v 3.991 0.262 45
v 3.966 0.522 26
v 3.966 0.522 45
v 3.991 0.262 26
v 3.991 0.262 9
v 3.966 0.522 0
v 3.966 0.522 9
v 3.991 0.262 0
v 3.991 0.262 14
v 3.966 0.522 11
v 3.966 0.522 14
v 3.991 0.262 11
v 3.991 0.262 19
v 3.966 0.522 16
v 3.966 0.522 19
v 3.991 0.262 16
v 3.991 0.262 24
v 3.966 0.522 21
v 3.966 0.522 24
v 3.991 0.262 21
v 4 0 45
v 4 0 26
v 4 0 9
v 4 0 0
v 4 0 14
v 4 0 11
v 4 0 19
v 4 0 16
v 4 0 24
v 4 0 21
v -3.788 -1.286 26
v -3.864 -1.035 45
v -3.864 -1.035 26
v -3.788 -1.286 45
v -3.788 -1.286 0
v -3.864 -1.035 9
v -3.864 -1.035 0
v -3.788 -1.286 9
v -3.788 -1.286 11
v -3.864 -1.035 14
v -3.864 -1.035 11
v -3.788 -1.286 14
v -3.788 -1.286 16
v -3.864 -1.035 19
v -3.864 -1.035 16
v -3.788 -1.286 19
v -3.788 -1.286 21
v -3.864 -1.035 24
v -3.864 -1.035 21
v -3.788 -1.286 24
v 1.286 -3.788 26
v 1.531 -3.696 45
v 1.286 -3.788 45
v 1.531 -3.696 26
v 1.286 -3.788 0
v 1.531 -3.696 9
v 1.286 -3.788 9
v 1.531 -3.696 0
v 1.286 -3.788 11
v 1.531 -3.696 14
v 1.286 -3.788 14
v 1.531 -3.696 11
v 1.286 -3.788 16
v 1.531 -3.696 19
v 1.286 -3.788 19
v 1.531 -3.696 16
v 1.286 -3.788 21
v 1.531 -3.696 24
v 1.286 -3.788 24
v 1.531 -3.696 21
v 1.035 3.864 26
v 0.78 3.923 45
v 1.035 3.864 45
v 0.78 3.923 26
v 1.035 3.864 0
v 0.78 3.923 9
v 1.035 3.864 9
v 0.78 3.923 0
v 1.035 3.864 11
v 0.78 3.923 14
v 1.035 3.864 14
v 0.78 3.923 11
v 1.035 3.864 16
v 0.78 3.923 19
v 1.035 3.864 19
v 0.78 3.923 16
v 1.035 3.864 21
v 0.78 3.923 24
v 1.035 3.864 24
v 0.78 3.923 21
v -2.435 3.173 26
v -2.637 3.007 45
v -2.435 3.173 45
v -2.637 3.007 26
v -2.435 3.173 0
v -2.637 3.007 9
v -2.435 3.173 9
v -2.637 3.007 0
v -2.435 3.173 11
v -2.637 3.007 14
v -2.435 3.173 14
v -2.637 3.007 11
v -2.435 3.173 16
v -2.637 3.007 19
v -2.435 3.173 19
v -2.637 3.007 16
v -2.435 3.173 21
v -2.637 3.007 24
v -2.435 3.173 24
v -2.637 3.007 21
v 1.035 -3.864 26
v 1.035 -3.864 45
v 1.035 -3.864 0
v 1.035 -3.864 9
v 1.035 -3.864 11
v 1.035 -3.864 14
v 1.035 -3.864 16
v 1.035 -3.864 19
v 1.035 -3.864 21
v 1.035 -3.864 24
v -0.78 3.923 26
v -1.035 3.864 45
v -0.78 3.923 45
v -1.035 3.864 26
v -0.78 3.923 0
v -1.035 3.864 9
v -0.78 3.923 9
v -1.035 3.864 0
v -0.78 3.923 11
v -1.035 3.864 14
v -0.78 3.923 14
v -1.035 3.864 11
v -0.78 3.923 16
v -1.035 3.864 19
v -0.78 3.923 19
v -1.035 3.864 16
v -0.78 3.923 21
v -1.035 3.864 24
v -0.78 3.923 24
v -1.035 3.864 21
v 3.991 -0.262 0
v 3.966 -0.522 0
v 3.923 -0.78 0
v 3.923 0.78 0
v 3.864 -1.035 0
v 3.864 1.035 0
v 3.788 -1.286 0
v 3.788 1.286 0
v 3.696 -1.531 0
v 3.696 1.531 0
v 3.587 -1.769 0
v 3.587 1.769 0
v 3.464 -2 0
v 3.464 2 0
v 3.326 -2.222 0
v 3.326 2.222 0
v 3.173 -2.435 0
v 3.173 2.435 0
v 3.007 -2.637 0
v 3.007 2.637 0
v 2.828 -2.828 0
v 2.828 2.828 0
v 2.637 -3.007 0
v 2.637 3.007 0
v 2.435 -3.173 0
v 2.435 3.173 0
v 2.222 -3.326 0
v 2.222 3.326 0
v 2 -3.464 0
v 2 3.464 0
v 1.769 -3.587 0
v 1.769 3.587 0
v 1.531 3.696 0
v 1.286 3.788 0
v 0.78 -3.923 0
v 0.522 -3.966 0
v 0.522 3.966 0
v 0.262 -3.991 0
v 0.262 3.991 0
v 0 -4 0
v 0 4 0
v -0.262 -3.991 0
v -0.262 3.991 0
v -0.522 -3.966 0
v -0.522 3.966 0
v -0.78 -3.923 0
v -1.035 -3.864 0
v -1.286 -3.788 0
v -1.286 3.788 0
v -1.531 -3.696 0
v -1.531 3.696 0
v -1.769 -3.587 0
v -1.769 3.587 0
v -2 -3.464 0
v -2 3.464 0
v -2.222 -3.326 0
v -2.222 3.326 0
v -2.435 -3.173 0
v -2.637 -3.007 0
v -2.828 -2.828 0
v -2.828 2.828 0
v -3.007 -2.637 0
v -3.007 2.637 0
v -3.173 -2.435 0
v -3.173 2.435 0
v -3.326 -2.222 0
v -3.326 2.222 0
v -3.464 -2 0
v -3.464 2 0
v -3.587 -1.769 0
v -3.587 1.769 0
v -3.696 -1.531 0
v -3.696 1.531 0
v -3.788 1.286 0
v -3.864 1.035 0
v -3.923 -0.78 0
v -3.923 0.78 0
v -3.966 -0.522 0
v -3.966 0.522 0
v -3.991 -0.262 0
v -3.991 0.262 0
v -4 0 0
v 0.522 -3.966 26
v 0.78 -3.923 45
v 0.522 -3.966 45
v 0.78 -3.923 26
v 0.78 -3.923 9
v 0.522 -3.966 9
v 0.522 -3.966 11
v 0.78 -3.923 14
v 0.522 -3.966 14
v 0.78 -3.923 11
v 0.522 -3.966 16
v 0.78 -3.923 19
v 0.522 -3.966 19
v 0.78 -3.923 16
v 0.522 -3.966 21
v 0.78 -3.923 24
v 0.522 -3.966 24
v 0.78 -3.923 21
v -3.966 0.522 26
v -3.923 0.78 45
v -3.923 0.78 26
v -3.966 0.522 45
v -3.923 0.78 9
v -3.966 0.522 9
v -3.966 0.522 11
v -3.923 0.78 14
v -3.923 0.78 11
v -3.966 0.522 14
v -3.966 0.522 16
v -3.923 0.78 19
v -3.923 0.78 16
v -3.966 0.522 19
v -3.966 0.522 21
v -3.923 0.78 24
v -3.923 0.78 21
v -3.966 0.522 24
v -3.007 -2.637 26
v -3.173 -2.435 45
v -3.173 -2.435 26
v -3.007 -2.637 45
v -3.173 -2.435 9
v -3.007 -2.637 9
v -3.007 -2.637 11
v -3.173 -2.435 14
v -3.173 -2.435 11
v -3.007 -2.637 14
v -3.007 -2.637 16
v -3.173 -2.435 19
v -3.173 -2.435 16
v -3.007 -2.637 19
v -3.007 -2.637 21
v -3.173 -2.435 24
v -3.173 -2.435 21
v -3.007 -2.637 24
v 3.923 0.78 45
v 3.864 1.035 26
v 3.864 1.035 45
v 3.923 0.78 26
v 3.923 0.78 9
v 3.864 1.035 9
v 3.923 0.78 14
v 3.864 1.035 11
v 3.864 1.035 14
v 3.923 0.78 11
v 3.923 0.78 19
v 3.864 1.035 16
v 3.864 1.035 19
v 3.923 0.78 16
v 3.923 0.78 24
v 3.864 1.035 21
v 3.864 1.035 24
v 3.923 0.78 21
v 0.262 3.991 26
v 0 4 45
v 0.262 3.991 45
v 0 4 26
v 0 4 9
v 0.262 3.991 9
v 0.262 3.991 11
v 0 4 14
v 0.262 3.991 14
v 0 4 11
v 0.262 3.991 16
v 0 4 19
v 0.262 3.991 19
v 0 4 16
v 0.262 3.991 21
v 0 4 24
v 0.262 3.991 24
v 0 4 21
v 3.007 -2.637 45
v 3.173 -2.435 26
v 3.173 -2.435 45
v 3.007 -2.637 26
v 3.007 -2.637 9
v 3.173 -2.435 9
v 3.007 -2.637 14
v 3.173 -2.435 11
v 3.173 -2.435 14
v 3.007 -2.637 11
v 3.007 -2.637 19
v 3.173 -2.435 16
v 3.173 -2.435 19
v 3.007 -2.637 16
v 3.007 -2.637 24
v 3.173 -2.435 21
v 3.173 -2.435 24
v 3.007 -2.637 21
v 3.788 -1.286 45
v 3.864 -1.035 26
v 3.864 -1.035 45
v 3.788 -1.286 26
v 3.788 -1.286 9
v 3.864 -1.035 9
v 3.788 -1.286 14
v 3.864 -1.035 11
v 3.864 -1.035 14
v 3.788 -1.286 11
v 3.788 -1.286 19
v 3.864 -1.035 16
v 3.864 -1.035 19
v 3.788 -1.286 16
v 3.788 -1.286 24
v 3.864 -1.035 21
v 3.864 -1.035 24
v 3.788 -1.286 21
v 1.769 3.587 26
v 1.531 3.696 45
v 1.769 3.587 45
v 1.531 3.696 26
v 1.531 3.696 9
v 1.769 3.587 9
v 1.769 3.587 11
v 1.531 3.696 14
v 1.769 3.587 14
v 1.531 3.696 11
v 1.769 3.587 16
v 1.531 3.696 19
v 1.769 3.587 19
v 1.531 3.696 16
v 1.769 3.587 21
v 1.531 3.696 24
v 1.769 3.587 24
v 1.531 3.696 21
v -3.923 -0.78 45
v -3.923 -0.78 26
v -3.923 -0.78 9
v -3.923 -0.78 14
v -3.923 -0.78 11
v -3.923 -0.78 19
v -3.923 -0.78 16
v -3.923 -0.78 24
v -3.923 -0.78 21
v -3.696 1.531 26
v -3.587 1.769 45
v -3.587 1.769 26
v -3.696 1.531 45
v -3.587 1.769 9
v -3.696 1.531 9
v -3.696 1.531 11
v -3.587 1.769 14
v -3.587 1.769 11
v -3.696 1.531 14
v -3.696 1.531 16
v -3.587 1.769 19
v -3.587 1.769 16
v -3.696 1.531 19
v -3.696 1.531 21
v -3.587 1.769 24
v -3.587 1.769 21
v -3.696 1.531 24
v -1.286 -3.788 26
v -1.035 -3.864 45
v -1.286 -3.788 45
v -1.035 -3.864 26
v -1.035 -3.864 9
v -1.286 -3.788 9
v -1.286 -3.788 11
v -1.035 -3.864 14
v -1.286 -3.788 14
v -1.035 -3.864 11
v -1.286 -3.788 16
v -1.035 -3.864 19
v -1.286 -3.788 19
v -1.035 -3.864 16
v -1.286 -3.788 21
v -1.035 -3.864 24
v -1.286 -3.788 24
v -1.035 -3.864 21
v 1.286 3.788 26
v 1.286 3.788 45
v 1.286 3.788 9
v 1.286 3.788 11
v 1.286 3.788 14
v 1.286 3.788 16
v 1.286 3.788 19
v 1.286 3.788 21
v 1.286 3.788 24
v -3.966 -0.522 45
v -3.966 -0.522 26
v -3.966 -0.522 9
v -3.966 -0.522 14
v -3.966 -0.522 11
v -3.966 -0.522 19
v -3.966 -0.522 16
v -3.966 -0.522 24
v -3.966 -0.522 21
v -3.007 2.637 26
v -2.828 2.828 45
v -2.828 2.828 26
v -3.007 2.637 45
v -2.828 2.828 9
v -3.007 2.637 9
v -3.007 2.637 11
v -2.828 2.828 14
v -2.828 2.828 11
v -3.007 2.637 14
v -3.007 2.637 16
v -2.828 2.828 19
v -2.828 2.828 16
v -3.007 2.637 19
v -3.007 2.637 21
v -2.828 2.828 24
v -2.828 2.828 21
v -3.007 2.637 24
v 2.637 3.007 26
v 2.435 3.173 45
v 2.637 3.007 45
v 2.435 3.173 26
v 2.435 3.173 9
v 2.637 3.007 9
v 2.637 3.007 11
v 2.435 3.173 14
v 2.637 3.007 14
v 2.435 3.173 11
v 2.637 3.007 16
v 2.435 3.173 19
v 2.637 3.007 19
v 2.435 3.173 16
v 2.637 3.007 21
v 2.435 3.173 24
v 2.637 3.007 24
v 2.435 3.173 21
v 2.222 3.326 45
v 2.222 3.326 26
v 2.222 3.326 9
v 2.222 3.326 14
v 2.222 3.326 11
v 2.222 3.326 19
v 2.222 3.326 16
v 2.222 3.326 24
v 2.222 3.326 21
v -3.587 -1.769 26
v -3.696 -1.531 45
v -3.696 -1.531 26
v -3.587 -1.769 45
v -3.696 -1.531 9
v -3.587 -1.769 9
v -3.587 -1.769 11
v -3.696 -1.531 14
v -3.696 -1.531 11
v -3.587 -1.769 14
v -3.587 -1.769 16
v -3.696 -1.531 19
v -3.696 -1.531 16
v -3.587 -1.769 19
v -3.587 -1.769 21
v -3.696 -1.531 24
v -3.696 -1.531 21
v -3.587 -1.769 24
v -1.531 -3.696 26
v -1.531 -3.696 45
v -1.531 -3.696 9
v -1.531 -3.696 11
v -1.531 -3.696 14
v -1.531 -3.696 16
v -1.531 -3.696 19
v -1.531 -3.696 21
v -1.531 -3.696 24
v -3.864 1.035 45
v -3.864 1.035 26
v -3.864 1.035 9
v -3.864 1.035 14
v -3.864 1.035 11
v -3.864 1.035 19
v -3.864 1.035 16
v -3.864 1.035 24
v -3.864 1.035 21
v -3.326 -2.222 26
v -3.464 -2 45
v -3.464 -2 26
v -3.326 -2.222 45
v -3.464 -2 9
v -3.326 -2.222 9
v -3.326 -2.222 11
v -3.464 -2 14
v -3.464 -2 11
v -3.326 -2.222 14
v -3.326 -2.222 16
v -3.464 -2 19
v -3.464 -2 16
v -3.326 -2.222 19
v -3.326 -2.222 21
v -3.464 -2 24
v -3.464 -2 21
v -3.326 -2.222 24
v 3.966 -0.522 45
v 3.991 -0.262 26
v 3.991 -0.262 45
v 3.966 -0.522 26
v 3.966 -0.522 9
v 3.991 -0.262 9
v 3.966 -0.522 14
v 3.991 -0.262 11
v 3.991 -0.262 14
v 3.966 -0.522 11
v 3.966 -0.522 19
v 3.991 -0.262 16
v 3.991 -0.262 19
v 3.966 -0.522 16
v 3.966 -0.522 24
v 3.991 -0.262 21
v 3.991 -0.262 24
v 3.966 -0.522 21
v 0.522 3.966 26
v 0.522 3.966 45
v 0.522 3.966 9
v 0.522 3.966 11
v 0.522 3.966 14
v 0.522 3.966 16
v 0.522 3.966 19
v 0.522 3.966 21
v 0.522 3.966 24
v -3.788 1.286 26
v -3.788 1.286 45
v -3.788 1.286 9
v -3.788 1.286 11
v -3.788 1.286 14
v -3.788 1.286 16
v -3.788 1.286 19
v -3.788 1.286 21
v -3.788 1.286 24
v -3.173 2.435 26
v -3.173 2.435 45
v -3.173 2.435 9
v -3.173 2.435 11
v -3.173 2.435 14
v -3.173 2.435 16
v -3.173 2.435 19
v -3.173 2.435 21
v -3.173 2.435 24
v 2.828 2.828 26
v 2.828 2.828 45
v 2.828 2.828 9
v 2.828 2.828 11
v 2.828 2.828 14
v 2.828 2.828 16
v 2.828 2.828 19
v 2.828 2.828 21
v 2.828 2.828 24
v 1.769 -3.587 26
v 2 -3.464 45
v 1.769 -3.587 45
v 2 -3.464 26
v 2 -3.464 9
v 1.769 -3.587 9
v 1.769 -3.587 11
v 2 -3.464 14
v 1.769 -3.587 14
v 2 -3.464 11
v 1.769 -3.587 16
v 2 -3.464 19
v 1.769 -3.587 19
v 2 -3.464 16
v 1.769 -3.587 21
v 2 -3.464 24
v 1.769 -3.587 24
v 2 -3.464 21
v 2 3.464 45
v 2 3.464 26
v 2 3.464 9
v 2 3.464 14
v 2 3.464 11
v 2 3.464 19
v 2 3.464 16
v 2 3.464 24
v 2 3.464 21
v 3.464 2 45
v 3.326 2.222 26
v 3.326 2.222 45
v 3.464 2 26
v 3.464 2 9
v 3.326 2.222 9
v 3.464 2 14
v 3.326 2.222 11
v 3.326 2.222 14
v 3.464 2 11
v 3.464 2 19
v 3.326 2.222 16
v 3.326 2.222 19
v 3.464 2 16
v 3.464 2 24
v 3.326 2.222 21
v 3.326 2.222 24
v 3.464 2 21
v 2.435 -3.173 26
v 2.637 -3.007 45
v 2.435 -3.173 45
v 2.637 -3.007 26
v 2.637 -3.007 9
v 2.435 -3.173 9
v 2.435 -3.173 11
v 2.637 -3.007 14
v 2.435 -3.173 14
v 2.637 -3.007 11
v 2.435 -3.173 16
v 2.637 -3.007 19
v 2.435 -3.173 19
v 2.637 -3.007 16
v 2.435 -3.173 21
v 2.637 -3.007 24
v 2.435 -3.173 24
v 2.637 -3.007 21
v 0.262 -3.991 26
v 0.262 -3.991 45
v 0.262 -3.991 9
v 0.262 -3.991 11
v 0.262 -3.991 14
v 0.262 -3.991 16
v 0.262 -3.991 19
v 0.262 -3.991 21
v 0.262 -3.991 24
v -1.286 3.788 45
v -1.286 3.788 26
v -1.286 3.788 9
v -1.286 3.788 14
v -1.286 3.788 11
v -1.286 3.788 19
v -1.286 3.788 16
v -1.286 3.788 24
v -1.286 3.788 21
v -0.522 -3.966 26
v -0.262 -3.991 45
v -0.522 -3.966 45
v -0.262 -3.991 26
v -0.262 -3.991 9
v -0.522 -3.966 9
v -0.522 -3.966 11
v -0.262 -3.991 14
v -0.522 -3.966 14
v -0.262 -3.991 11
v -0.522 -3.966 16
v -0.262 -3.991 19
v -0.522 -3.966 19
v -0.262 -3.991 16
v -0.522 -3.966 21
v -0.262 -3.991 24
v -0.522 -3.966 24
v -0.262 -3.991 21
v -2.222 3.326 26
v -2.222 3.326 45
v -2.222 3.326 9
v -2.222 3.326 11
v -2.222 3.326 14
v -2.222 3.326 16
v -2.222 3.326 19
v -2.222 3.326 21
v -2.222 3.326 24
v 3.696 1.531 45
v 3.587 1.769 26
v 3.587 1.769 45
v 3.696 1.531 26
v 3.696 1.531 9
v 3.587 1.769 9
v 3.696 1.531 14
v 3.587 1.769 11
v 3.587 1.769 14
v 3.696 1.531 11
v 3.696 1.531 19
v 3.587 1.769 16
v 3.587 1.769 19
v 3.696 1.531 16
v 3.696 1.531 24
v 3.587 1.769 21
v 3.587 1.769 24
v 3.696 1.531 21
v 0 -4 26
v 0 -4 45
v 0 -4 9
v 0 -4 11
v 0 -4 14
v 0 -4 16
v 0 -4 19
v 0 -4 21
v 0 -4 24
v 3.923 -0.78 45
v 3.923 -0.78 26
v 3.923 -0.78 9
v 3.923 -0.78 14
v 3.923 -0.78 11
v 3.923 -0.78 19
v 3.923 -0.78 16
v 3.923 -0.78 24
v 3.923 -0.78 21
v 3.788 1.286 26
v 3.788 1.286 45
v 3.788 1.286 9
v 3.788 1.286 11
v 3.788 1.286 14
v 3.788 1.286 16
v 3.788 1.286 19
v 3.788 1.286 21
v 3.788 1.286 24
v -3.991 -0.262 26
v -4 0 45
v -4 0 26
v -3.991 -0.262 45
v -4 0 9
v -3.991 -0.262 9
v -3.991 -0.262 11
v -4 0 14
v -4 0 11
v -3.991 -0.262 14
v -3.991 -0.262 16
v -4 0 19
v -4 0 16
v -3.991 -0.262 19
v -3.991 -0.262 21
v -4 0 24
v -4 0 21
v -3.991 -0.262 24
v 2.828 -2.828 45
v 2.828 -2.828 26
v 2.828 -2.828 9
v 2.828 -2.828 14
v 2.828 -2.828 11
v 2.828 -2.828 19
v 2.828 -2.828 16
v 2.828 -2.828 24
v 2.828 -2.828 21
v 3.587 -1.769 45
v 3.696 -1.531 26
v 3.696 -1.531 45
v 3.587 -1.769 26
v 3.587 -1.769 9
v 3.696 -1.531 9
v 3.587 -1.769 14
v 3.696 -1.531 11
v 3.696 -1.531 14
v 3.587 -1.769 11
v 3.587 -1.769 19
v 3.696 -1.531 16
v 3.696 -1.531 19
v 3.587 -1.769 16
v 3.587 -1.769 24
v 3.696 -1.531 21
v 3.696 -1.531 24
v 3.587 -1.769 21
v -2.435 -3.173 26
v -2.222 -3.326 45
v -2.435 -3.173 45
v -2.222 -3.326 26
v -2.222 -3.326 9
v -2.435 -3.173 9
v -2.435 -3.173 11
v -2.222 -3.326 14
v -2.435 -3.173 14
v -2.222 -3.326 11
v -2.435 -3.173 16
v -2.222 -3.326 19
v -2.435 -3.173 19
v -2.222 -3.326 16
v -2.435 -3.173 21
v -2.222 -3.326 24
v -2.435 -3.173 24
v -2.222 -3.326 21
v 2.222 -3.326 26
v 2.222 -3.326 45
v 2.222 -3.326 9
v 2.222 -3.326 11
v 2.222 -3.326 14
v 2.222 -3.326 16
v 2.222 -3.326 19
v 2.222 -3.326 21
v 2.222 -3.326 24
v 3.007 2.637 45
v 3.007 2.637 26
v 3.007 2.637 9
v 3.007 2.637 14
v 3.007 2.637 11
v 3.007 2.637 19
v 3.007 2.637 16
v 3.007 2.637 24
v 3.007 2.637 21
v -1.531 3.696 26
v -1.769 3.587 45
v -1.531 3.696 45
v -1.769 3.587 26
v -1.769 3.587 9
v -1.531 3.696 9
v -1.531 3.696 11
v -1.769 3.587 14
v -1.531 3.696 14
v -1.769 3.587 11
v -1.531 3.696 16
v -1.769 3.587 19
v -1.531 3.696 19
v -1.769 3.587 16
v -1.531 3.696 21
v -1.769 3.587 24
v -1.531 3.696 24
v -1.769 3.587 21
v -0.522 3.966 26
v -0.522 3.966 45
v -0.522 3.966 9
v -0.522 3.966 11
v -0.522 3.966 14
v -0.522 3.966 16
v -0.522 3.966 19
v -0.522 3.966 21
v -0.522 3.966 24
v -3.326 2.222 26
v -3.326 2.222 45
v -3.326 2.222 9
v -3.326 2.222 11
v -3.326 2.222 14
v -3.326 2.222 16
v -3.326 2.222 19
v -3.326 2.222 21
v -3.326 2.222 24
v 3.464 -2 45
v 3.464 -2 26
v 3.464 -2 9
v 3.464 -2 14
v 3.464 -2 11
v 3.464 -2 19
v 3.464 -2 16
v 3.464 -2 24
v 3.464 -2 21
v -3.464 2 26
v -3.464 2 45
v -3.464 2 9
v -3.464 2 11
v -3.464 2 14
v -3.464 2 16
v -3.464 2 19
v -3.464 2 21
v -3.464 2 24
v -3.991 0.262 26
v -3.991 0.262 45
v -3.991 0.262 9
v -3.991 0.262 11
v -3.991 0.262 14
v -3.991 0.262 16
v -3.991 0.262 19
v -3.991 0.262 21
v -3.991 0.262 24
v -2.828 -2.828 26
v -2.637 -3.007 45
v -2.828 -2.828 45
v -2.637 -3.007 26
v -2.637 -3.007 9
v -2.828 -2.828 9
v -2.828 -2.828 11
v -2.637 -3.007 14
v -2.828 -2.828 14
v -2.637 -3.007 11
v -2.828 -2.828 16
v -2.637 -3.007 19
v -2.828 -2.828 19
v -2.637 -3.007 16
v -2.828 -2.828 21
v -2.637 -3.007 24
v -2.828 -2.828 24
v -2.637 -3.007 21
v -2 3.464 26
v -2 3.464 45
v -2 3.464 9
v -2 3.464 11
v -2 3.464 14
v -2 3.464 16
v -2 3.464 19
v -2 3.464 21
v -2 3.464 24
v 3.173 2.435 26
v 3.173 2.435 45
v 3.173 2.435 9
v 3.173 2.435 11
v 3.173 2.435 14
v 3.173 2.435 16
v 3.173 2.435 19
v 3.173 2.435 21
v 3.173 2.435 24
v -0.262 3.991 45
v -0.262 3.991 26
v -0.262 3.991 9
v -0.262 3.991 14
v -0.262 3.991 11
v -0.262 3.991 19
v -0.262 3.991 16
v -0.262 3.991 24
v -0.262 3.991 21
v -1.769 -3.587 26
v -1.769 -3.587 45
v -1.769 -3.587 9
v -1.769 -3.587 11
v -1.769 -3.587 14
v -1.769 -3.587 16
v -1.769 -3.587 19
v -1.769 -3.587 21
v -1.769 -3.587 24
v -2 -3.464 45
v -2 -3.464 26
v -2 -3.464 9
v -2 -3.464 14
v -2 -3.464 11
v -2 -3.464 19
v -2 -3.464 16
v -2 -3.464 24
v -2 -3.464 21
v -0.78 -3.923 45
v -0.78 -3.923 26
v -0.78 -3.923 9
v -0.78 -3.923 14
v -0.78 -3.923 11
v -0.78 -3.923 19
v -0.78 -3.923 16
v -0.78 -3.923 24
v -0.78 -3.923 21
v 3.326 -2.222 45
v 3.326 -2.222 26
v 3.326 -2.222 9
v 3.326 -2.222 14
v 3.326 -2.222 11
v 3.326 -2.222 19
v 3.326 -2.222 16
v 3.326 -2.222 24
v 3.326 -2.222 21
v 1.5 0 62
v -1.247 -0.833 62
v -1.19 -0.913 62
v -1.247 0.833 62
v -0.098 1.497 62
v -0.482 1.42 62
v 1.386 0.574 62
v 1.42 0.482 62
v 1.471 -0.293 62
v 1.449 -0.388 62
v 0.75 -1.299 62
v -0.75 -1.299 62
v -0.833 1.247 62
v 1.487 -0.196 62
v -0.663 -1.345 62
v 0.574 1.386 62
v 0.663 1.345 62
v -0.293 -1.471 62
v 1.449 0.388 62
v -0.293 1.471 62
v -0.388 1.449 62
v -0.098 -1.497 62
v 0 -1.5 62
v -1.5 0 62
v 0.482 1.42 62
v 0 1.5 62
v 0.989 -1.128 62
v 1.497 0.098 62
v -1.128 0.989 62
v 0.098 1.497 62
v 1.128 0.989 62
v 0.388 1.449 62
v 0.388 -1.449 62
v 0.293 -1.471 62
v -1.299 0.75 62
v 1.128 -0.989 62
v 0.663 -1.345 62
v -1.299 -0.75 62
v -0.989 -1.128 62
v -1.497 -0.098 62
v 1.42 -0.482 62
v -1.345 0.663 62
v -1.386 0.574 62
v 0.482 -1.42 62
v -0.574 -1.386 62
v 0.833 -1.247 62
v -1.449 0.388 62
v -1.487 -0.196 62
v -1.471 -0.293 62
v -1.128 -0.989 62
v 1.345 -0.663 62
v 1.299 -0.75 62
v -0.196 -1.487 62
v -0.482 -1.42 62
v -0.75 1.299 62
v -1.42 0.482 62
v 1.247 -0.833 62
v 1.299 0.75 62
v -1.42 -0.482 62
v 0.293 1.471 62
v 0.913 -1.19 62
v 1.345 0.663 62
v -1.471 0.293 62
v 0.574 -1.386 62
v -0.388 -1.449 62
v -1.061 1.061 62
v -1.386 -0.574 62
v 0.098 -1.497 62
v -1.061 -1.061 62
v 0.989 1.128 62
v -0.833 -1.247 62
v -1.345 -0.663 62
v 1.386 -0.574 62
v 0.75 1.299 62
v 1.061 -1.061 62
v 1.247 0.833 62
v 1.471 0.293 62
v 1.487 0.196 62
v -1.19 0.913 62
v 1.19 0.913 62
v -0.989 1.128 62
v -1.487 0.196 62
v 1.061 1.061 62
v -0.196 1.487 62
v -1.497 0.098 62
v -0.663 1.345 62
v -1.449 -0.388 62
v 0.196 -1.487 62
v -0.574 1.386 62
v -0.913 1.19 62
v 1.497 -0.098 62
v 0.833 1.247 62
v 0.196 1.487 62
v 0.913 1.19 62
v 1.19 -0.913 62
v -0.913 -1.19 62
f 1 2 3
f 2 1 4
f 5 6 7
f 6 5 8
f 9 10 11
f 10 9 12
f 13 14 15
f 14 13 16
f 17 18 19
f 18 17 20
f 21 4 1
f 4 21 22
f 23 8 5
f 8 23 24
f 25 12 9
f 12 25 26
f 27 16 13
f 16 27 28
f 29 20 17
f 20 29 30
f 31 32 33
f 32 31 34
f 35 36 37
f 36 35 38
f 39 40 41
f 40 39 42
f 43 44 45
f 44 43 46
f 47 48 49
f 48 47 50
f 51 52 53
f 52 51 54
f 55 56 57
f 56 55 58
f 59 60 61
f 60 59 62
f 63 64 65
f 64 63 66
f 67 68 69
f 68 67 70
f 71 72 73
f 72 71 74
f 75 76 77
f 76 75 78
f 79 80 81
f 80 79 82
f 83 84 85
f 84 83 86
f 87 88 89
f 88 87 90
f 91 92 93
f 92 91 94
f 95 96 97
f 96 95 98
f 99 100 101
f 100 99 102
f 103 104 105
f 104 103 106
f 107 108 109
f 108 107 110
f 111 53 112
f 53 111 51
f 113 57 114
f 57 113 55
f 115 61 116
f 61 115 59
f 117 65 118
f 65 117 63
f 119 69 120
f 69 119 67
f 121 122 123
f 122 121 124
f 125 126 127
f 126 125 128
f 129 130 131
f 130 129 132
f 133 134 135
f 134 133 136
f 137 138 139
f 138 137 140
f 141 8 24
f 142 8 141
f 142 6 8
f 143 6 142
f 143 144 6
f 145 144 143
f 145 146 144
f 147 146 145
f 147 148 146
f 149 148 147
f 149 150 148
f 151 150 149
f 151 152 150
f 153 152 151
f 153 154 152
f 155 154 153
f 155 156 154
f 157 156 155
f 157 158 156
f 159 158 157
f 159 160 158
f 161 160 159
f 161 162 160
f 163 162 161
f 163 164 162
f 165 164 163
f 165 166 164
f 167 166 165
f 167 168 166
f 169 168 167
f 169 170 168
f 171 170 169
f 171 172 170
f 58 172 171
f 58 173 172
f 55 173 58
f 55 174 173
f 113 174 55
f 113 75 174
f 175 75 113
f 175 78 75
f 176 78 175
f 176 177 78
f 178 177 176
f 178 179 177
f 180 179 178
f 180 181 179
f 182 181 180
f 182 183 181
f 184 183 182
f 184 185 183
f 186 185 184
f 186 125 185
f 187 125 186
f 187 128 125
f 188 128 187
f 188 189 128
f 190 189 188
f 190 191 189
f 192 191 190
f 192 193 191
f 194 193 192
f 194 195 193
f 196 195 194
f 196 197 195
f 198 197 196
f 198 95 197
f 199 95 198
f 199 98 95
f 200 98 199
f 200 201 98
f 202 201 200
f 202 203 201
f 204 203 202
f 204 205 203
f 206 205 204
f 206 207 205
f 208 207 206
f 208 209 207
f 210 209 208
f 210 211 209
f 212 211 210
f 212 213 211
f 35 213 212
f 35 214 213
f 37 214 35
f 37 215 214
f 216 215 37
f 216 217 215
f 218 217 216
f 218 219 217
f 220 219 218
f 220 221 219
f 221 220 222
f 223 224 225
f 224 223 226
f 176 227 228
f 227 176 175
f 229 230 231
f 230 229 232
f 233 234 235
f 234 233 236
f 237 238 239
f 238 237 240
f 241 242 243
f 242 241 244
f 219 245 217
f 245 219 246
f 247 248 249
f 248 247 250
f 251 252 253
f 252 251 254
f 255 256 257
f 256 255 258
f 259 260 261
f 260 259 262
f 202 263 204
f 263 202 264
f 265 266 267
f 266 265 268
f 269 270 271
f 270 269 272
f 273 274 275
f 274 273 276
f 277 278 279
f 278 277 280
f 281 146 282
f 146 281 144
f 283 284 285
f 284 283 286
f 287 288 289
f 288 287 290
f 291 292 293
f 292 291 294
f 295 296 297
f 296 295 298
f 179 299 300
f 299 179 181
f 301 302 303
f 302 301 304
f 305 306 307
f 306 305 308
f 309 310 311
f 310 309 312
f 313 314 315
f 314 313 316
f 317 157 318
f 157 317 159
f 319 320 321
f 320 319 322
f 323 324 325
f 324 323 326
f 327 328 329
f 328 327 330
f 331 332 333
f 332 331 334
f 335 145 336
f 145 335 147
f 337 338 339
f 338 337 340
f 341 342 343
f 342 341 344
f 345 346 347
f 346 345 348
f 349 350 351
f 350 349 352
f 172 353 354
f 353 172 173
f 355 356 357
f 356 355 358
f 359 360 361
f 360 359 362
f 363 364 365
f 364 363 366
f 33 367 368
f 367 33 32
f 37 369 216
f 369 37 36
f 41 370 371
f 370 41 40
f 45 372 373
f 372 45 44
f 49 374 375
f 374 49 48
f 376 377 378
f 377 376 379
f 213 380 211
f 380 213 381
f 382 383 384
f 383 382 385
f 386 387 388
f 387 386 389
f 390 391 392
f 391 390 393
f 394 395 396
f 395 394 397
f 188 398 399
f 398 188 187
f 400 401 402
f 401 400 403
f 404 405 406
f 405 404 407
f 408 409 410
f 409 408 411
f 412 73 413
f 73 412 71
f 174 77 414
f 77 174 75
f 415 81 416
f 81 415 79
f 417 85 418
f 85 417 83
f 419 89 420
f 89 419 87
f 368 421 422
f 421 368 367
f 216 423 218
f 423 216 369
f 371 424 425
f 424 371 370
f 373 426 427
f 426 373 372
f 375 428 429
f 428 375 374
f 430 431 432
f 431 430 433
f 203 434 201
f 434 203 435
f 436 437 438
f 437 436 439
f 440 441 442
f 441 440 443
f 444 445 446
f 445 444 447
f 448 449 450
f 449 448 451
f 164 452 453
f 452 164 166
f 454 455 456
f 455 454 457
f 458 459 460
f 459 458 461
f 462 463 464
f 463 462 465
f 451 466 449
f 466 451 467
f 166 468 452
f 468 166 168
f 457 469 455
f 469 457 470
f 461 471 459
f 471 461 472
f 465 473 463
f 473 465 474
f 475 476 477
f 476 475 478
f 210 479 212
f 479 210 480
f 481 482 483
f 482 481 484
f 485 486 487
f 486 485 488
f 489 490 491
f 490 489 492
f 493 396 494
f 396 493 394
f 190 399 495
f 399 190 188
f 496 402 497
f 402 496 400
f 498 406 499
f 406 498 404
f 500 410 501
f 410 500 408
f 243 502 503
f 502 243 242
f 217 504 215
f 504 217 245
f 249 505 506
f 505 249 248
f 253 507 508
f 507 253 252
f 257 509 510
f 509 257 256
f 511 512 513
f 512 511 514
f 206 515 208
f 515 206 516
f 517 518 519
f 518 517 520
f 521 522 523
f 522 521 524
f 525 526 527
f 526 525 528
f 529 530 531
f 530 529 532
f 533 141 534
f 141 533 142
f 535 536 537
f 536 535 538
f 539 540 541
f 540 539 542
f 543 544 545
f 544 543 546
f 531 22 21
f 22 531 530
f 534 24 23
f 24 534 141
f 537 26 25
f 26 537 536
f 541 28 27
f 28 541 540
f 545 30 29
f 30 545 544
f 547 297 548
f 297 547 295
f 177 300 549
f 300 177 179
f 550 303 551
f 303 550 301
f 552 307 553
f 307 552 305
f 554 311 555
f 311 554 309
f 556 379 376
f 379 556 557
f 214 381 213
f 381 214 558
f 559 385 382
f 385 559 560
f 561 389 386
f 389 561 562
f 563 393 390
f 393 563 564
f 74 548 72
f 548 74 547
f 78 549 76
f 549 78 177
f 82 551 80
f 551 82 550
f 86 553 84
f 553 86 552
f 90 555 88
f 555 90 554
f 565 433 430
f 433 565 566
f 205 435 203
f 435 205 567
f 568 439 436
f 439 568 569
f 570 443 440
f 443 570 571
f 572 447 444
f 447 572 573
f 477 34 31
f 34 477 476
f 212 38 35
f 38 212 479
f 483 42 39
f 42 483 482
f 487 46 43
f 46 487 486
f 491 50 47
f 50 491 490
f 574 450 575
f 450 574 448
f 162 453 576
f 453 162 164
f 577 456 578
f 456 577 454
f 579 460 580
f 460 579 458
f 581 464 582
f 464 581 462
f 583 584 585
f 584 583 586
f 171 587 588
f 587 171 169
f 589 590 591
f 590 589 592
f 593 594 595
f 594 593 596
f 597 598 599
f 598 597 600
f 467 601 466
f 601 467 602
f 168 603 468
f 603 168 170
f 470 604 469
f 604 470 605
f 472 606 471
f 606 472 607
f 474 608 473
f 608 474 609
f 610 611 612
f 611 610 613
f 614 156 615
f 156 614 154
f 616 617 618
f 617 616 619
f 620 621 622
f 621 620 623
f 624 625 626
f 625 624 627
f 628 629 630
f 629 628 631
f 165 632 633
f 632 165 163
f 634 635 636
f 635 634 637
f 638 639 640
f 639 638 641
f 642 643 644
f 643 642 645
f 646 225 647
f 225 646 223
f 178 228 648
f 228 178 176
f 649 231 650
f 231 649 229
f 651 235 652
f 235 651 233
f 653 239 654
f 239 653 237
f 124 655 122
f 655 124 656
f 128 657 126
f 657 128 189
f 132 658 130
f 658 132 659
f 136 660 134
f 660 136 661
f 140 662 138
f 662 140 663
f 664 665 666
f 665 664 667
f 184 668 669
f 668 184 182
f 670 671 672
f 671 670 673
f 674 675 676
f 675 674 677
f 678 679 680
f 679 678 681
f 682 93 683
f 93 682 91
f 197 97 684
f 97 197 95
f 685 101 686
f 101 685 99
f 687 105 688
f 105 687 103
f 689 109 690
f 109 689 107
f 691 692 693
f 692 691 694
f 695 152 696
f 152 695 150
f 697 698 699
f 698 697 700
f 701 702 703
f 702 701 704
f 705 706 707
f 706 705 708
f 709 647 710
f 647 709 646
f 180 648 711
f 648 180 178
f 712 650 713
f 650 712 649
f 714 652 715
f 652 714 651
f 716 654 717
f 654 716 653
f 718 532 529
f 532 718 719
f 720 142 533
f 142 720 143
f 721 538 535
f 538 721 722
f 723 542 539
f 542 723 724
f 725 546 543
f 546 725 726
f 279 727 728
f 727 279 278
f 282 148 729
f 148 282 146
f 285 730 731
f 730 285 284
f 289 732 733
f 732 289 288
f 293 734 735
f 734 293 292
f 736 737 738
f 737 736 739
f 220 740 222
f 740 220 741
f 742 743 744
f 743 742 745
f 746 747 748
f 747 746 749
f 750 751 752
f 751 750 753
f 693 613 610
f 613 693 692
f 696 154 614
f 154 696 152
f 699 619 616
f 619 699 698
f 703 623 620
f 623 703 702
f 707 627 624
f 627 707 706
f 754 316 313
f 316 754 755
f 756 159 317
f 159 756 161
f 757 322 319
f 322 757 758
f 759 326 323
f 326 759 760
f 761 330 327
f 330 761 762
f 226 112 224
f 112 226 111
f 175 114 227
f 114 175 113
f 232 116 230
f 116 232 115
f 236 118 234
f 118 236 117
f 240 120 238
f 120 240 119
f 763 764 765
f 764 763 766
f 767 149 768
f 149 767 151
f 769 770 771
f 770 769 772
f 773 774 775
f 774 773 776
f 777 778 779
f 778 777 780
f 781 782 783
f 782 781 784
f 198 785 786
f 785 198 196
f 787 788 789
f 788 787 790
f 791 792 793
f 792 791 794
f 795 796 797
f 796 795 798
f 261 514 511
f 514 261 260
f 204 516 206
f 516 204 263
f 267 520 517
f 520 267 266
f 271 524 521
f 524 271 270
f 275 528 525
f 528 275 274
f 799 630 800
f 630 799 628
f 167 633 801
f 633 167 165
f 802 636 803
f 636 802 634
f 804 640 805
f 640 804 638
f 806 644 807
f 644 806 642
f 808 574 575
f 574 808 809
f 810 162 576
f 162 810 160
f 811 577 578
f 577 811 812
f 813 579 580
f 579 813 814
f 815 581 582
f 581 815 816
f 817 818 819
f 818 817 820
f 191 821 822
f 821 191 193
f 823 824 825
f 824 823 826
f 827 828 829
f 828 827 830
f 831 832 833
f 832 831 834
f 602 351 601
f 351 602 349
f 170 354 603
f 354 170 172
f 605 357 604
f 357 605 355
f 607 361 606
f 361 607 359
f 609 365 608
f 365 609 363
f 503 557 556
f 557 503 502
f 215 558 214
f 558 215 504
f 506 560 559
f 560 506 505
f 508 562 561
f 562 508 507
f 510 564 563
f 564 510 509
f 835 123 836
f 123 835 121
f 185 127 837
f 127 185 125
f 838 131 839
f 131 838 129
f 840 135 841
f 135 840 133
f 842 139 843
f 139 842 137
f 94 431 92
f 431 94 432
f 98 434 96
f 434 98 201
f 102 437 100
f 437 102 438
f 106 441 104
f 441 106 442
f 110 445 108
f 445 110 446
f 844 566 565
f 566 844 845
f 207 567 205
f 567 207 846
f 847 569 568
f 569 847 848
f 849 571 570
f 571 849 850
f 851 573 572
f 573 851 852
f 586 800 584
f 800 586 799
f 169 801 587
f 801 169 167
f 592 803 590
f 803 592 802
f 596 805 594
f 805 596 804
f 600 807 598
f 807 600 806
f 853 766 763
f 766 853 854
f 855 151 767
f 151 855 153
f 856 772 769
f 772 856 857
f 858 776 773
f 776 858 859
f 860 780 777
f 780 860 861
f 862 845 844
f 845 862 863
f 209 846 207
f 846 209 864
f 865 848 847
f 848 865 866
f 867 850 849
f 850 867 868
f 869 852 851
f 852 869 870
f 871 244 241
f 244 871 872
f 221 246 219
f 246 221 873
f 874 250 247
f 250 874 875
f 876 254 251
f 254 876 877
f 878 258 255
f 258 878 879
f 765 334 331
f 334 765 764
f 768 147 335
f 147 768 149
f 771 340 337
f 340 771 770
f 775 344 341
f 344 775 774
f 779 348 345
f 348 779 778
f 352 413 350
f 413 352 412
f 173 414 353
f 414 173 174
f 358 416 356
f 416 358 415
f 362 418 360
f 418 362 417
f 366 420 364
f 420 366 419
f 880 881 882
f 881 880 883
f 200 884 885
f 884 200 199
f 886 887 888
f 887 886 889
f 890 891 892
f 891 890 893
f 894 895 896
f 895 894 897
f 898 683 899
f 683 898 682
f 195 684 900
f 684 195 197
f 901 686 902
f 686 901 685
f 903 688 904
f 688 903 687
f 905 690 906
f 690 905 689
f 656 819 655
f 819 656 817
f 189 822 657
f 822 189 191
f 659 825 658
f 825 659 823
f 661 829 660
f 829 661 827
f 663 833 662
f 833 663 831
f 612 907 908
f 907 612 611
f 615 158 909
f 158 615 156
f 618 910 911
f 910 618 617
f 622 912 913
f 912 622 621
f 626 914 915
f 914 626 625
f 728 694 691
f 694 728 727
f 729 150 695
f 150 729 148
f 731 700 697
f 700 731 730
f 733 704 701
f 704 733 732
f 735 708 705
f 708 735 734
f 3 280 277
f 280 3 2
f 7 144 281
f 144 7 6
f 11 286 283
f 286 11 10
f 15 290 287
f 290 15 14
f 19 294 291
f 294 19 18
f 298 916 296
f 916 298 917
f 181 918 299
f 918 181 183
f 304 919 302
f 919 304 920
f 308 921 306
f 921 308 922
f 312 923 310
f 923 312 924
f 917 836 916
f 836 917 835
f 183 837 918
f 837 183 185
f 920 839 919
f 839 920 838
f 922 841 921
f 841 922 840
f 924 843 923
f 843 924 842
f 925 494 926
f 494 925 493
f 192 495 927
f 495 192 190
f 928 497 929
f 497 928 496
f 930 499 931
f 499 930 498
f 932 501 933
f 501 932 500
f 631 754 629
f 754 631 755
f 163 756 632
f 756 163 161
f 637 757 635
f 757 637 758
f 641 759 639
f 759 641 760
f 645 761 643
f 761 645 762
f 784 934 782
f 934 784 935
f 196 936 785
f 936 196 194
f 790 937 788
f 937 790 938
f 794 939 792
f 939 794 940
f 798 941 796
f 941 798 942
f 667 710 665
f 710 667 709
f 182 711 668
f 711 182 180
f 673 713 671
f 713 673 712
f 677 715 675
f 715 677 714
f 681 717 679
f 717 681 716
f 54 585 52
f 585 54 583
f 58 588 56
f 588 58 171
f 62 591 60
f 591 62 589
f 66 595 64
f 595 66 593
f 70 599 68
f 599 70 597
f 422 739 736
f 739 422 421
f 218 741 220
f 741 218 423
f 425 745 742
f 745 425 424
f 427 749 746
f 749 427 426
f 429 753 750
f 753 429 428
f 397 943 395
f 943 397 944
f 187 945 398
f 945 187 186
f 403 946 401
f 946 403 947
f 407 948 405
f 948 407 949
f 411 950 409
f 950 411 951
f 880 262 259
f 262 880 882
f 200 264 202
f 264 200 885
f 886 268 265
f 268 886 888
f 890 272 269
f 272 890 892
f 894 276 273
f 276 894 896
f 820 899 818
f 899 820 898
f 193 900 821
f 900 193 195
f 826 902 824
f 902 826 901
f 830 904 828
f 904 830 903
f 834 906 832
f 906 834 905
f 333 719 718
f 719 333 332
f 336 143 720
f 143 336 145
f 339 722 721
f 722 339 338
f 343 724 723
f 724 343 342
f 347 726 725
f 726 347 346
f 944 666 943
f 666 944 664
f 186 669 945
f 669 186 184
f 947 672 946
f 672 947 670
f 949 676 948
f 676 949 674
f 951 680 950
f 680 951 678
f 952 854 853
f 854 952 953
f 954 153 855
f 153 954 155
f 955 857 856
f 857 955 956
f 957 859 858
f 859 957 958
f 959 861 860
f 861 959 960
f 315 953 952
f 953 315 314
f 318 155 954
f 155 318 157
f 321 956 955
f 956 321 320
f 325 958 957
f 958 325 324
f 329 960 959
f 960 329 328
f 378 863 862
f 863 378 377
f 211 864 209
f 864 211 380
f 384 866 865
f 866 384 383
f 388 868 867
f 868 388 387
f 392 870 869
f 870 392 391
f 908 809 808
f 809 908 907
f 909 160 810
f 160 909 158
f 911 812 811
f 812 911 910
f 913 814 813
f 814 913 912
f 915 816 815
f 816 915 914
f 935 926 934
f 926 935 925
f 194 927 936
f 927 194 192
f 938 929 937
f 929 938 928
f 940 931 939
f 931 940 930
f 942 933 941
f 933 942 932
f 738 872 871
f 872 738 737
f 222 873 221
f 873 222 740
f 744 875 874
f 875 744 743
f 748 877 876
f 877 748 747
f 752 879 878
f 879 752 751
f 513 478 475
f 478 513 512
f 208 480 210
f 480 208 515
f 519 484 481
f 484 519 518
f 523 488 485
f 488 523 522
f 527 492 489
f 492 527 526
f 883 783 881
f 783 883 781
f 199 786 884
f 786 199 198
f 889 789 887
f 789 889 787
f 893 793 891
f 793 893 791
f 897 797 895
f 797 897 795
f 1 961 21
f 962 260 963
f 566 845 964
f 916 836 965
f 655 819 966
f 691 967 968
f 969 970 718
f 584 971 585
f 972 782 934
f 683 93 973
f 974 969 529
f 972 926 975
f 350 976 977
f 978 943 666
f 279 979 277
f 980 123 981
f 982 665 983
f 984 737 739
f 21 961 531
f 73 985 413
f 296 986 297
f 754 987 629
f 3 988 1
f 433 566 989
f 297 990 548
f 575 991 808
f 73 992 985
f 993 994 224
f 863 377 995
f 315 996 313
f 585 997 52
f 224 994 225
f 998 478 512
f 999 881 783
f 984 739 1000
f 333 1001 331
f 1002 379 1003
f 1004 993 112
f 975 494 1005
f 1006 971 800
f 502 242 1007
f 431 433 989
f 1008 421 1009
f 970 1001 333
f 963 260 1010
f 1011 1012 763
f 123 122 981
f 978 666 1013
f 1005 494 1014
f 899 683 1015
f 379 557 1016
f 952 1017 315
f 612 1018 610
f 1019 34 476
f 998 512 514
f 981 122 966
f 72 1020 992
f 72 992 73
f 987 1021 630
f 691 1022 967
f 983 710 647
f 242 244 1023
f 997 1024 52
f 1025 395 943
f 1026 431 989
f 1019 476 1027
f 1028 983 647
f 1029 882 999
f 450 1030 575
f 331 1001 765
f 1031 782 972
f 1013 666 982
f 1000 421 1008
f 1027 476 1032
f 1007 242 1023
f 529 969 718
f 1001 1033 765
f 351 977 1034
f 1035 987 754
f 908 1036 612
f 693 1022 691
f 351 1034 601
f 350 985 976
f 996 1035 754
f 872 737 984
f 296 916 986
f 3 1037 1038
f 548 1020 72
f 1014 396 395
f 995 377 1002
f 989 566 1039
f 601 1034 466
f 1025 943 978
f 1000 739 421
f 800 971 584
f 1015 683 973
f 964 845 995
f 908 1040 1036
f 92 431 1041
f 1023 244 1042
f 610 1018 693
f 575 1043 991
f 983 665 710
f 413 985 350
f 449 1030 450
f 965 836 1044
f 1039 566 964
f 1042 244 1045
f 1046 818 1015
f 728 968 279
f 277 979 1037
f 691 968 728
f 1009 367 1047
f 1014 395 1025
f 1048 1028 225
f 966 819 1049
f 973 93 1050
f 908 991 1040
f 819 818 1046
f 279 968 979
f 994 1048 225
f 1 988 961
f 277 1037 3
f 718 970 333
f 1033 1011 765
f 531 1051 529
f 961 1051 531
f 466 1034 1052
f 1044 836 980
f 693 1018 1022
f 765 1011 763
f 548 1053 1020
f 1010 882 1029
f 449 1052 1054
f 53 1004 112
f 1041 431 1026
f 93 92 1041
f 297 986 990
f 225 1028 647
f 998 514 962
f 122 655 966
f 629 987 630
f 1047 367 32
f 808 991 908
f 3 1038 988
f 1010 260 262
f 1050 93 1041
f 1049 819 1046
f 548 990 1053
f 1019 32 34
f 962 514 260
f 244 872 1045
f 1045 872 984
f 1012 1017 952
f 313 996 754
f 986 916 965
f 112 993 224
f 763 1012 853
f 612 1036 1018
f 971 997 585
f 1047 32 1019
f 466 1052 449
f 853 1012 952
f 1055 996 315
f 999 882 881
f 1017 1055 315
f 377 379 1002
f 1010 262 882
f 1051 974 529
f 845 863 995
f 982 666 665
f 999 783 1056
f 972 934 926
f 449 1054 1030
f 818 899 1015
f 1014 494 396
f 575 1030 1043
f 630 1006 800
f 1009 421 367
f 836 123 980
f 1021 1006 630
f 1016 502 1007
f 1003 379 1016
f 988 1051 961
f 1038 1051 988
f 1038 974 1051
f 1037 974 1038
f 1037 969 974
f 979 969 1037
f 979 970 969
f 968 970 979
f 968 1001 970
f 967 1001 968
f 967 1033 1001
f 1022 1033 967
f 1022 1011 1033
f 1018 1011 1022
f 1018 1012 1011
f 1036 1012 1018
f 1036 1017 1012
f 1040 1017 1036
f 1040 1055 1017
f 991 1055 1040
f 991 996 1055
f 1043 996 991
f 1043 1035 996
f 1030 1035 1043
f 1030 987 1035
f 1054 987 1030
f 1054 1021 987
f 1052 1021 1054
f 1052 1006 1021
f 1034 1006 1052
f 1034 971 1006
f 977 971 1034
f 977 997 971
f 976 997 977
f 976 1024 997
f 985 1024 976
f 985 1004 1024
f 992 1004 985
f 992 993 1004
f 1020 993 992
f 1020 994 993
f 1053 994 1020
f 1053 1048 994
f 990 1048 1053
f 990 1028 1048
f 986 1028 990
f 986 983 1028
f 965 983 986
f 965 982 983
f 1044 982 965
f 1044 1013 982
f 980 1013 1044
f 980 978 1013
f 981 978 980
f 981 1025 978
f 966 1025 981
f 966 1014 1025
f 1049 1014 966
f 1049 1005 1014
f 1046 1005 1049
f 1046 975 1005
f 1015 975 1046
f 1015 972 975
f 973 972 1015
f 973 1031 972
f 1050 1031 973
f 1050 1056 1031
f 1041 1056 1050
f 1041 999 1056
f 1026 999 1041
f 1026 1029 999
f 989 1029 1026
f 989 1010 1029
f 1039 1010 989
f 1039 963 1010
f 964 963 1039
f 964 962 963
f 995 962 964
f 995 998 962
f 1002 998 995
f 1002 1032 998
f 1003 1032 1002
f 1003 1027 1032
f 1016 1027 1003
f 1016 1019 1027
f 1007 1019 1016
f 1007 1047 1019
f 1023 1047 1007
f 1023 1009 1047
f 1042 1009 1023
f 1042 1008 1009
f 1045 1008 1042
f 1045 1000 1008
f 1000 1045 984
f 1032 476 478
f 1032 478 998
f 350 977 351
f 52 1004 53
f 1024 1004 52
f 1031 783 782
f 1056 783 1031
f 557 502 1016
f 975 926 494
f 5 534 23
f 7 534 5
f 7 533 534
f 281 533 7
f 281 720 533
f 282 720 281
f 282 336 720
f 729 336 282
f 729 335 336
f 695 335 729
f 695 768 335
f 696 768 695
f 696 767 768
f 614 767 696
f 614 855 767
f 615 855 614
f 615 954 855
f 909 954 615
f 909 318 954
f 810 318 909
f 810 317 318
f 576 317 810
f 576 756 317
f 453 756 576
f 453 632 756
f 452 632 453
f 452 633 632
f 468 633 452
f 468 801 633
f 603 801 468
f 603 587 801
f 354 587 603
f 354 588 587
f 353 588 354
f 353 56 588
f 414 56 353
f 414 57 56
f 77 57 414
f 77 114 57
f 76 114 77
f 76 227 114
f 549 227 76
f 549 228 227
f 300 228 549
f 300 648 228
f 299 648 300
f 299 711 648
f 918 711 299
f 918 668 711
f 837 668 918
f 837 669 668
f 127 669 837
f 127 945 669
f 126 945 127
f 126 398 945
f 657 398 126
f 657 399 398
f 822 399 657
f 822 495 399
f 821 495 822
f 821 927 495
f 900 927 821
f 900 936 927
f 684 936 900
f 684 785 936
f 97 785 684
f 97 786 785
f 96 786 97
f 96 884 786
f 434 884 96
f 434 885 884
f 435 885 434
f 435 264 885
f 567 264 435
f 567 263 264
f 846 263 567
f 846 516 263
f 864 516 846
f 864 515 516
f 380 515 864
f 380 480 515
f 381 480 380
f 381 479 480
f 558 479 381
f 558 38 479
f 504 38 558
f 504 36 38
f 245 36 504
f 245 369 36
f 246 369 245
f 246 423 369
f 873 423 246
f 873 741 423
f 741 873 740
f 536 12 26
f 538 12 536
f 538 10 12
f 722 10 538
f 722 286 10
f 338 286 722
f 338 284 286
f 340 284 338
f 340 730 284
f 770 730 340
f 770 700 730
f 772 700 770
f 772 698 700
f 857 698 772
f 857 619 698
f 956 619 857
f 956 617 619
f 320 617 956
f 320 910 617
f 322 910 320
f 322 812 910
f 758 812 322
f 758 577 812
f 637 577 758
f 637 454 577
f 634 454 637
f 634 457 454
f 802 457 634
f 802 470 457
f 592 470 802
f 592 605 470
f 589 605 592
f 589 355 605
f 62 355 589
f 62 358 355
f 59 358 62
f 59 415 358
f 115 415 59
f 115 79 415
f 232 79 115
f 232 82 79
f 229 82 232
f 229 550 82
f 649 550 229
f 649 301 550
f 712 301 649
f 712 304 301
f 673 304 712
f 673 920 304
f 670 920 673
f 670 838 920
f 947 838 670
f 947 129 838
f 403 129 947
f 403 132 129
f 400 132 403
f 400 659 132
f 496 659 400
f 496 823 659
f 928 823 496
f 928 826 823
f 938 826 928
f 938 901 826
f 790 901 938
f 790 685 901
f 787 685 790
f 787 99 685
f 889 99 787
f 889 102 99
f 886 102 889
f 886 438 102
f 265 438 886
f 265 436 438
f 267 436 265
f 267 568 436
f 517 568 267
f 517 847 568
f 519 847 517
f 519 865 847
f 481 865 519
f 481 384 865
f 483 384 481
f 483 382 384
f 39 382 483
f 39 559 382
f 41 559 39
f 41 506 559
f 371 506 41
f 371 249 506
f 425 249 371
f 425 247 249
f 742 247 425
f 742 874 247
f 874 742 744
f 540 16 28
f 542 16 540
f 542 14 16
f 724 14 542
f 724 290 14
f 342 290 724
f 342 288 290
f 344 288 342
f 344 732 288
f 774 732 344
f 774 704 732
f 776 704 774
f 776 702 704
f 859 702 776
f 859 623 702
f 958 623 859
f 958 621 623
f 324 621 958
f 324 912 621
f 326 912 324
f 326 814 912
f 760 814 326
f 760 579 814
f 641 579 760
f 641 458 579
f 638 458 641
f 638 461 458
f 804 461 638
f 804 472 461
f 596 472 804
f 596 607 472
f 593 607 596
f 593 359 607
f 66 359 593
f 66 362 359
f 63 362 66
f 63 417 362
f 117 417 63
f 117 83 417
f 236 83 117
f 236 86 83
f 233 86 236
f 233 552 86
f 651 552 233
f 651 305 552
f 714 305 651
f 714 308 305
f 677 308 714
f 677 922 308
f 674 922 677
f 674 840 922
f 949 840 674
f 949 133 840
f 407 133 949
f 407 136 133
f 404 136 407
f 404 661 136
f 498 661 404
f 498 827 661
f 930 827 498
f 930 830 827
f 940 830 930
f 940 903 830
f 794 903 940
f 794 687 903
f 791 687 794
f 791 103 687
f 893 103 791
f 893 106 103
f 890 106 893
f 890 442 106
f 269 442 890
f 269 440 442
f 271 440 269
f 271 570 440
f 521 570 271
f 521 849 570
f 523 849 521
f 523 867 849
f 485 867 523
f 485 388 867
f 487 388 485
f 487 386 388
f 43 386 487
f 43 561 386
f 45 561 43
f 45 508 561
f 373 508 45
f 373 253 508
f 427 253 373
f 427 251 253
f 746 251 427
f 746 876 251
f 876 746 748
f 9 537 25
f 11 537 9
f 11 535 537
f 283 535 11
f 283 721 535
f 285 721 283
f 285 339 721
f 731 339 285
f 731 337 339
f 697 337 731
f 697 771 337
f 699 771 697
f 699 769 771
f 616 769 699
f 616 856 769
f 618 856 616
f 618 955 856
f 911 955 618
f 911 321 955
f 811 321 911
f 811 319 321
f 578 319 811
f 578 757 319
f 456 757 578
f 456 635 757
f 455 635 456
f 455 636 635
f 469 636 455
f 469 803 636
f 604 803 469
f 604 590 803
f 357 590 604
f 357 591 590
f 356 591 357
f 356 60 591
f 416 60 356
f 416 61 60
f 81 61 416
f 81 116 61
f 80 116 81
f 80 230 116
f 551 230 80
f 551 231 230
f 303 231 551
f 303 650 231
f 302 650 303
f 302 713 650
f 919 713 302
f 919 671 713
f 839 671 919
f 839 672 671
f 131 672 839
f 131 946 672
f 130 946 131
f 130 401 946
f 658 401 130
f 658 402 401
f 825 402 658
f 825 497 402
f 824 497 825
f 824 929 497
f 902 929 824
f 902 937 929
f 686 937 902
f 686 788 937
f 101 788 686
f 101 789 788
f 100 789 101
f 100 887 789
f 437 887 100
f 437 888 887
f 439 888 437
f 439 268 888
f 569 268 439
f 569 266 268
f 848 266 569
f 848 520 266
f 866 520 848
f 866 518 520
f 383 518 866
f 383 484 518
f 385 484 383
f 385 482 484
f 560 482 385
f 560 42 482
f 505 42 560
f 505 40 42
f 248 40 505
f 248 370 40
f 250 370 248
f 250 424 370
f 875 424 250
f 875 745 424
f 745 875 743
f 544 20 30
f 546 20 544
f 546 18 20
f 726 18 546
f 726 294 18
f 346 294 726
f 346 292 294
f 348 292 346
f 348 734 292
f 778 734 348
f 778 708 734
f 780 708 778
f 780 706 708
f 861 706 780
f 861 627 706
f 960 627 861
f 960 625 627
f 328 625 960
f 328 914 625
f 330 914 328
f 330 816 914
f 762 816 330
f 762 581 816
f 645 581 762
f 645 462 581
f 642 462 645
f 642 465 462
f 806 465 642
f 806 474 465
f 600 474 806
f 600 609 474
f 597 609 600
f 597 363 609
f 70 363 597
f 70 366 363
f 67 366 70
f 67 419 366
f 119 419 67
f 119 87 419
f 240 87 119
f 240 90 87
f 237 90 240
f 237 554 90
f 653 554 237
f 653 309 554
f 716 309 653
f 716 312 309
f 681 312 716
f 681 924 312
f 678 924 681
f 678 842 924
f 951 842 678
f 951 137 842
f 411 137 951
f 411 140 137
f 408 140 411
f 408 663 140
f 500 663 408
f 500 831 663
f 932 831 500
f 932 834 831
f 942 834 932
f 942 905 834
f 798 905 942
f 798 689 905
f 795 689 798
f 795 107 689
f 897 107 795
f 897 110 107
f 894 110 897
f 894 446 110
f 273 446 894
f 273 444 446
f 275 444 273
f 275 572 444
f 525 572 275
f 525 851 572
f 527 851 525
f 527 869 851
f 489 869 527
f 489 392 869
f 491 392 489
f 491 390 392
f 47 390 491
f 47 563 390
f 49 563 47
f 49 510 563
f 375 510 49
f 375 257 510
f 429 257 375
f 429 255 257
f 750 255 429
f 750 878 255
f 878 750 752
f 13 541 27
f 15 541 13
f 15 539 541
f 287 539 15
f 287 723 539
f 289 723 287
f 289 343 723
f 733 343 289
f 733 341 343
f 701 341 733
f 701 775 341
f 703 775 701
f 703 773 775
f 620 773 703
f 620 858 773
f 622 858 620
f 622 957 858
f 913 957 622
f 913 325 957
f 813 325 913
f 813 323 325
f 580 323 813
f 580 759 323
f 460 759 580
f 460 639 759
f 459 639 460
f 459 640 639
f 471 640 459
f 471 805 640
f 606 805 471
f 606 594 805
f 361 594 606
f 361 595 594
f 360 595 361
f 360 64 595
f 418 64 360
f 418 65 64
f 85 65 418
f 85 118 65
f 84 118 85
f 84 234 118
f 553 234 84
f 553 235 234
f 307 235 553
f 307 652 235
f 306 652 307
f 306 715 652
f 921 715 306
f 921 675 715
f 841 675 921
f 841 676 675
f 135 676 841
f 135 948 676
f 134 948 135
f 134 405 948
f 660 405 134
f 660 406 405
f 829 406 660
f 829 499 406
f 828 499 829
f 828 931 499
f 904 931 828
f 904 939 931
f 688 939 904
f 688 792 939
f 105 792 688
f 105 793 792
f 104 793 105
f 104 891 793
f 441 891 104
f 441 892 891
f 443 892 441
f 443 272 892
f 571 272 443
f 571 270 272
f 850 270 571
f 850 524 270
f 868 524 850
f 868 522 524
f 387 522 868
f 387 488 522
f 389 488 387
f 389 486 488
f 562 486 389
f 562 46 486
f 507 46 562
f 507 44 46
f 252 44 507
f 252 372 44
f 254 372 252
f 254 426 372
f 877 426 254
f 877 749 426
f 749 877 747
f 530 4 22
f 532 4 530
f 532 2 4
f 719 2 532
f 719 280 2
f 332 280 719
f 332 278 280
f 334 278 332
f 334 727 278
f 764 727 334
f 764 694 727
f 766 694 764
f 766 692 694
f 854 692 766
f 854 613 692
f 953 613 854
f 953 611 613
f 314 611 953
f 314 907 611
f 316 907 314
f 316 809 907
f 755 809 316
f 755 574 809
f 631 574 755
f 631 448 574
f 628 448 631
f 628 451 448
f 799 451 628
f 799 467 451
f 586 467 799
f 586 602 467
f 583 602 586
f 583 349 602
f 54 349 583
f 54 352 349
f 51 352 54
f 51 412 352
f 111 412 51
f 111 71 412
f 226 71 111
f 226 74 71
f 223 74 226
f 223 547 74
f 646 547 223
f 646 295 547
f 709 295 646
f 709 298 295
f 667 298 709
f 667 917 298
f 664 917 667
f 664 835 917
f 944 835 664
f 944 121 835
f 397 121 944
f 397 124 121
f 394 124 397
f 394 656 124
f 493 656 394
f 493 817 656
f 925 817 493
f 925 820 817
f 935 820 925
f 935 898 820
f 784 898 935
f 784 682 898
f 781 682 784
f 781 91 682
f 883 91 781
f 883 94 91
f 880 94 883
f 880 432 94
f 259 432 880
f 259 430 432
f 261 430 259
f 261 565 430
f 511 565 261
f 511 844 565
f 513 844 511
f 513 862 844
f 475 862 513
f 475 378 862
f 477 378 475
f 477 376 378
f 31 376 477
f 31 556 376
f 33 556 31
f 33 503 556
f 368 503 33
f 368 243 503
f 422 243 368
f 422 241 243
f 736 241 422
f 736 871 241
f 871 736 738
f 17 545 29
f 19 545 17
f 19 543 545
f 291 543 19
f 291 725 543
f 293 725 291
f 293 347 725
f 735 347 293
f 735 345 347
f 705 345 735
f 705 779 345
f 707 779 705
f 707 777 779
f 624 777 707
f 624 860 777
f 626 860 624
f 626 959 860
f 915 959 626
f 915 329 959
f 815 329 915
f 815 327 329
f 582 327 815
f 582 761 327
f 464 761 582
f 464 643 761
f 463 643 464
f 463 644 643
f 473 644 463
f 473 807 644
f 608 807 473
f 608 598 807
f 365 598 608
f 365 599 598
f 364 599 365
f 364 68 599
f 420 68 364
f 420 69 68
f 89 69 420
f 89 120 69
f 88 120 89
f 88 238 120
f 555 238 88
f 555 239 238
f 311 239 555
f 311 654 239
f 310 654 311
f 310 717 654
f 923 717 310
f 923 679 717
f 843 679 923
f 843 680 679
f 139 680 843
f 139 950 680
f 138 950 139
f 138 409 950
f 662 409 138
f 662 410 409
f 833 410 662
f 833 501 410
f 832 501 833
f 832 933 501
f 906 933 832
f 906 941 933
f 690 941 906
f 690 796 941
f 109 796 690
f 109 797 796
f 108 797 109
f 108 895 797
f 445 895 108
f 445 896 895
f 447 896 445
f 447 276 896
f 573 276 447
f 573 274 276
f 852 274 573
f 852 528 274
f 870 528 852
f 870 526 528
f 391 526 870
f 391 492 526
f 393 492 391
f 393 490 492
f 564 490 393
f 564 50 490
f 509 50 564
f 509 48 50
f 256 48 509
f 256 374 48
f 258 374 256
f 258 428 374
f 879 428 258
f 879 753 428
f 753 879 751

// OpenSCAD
// Tissue-grinding pestle for a 1.5 mL microcentrifuge tube
// Print orientation: standing upright on the bed (z = 0), building upward.

// ---------------- Parameters ----------------
handle_d      = 8;    // handle diameter (mm)
handle_h      = 45;   // handle height (mm), z = 0 to 45
cone_top_d    = 8;    // cone diameter at the handle/cone junction (z = 45)
cone_bottom_d = 3;    // cone diameter at its apex (z = 62)
cone_h        = 17;   // cone height (mm), 62 - 45
tip_r         = 1.5;  // rounded tip radius (mm), 3 mm diameter
tip_h         = 1.5;  // tip height (mm), z = 62 to 63.5
groove_count  = 4;    // number of circumferential grip grooves
groove_w      = 2;    // groove width (mm) along Z
groove_depth  = 1;    // groove depth (mm) into the handle wall
groove_z      = [10, 15, 20, 25]; // groove centre heights (mm)
eps           = 0.5;  // overshoot for clean boolean cuts (mm)

$fn = 96;             // smoothness of curved surfaces

// ---------------- Model ----------------
difference() {
    // Main body: handle + cone + rounded tip
    union() {
        // Handle: z = 0 to 45
        cylinder(d = handle_d, h = handle_h);

        // Cone: z = 45 to 62 (apex at cone_bottom_d)
        translate([0, 0, handle_h])
            cylinder(d1 = cone_top_d, d2 = cone_bottom_d, h = cone_h);

        // Rounded tip: z = 62 to 63.5
        translate([0, 0, handle_h + cone_h - tip_h])
            cylinder(r = tip_r, h = tip_h, $fn = 96);
    }

    // Grip grooves cut into the handle wall
    for (g = [0 : groove_count - 1]) {
        translate([0, 0, groove_z[g] - groove_w / 2])
            cylinder(d = handle_d + 2 * eps, h = groove_w);
    }
}
